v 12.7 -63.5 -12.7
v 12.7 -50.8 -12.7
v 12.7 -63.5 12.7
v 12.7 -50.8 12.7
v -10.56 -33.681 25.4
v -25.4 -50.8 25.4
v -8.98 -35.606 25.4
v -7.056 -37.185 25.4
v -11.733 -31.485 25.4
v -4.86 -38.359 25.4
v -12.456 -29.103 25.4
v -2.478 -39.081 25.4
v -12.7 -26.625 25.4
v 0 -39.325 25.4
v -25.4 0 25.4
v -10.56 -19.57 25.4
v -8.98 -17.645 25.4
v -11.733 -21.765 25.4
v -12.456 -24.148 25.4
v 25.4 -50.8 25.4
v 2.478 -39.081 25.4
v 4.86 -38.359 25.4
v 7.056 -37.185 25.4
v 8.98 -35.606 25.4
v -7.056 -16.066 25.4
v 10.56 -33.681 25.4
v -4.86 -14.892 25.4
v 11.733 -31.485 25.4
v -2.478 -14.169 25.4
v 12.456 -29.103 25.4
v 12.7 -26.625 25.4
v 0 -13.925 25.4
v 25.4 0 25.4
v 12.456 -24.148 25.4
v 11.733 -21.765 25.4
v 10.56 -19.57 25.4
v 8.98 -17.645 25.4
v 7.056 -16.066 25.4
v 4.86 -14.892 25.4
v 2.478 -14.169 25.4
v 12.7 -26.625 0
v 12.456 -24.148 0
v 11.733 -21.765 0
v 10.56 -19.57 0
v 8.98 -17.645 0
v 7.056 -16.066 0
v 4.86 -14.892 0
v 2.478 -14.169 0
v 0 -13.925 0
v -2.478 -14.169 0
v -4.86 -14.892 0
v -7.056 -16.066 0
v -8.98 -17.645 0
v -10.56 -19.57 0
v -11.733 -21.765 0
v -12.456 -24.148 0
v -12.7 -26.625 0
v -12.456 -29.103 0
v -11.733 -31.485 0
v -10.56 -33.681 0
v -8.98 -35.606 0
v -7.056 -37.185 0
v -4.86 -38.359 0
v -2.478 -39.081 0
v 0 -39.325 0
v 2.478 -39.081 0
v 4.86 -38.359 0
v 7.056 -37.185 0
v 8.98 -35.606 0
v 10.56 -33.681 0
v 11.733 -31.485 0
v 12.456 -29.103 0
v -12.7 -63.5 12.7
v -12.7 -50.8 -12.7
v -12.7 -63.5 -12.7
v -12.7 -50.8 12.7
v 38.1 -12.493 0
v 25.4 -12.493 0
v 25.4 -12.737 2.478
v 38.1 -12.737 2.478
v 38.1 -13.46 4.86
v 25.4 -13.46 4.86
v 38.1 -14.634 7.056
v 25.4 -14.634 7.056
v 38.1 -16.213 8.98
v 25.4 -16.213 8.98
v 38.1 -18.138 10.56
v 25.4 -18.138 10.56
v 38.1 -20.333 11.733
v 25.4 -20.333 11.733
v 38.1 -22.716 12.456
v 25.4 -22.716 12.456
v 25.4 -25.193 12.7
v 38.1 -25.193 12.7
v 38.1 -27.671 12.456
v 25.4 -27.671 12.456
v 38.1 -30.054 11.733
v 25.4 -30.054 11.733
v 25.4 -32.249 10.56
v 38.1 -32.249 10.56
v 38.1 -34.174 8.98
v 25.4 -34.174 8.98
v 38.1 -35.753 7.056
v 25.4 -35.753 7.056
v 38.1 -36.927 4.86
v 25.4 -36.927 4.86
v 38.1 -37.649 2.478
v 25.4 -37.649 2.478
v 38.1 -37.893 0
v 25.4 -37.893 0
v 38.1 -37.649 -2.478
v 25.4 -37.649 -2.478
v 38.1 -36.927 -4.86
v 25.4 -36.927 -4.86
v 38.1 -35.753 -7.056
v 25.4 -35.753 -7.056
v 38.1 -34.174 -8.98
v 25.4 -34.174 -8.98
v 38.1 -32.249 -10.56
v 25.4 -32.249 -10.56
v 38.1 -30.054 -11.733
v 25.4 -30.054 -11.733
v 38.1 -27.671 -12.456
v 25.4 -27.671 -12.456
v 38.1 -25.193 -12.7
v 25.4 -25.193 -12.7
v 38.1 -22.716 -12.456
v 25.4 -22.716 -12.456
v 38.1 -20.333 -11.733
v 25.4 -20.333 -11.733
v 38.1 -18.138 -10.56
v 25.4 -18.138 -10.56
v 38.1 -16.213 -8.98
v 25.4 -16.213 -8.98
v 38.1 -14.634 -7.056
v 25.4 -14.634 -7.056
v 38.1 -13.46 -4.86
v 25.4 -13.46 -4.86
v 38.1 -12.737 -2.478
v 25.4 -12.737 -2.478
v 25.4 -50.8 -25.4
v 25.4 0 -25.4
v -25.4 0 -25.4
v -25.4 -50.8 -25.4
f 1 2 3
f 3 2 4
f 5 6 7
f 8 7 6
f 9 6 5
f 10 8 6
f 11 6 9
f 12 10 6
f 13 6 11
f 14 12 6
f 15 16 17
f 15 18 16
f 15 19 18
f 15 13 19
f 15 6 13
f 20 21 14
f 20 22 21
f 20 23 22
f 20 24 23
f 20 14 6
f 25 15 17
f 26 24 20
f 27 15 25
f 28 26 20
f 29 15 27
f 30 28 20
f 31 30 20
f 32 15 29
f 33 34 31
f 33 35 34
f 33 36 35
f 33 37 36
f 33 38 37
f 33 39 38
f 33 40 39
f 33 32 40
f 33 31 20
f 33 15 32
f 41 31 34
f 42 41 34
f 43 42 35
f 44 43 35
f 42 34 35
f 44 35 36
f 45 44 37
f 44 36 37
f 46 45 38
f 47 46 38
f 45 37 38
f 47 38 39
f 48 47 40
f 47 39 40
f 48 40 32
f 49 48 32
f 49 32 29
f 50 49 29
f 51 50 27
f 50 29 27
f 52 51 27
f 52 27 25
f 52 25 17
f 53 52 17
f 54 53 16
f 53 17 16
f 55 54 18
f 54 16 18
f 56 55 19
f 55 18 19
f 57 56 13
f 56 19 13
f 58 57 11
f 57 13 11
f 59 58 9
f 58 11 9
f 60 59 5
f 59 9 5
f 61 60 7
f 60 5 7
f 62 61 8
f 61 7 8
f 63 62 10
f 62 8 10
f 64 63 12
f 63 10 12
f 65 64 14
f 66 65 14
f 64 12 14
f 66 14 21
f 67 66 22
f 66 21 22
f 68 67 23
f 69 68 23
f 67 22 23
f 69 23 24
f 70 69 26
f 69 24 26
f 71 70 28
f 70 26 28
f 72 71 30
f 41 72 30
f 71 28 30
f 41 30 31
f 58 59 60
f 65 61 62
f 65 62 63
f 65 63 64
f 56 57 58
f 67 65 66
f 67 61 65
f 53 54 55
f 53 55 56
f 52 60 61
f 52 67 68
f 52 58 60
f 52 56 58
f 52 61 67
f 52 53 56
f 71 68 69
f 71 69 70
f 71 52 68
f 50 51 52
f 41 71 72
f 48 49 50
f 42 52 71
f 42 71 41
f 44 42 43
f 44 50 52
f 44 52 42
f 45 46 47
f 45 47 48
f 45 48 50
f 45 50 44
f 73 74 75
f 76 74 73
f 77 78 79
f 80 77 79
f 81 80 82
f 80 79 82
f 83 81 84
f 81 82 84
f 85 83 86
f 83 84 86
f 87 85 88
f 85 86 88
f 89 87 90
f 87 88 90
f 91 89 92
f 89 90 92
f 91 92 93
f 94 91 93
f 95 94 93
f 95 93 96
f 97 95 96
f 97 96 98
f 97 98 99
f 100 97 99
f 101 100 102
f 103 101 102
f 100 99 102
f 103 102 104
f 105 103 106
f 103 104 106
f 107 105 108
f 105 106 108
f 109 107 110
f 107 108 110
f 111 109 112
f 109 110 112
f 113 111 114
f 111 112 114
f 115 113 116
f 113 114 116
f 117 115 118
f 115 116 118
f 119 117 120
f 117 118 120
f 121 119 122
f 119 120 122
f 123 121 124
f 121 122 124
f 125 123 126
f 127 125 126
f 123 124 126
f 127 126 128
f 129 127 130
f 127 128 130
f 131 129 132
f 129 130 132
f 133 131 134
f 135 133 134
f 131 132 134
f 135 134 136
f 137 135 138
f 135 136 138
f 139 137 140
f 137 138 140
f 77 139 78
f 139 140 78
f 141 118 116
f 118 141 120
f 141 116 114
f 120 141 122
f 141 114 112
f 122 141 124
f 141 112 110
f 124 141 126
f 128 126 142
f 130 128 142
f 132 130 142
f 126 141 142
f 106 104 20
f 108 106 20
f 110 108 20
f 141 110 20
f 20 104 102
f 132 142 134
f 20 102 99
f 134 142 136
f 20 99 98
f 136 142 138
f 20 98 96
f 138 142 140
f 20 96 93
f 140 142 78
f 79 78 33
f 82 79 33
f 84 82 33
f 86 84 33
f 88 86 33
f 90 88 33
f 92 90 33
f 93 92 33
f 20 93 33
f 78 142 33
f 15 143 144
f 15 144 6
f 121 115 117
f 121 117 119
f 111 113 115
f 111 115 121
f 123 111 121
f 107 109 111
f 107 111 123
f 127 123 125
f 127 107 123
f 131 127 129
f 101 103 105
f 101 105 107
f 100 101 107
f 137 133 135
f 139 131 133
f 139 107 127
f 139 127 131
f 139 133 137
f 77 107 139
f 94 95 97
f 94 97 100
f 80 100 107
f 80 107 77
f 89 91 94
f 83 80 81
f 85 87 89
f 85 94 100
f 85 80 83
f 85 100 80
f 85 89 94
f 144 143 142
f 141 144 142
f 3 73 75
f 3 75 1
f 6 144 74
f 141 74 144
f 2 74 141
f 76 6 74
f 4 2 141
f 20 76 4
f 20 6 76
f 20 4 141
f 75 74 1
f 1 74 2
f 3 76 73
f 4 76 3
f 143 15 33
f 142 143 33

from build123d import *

# Parameters (mm, degrees)
F0_W     = 50.8
F0_H     = 50.8
F1_DEPTH = 50.8
F2_W     = 25.4
F2_H     = 25.4
F3_DEPTH = 12.7
F4_R     = 12.7
F5_DEPTH = 12.7
F6_R     = 12.7
F7_DEPTH = 25.4


with BuildPart() as f1:
    # F0 (on Front) → F1 (new body)
    with BuildSketch(Plane.XZ):
        Rectangle(F0_W, F0_H)
    extrude(amount=F1_DEPTH)

    # F2 (on face) → F3 (join)
    with BuildSketch(Plane.XZ.offset(50.8)):
        Rectangle(F2_W, F2_H)
    extrude(amount=F3_DEPTH)

    # F4 (on face) → F5 (join)
    with BuildSketch(Plane.YZ.offset(25.4)):
        with Locations((-25.19346, 0)):
            Circle(F4_R)
    extrude(amount=F5_DEPTH)

    # F6 (on face) → F7 (cut)
    with BuildSketch(Plane.XY.offset(25.4)):
        with Locations((0, -26.625345)):
            Circle(F6_R)
    extrude(amount=-F7_DEPTH, mode=Mode.SUBTRACT)


solid = f1.part
